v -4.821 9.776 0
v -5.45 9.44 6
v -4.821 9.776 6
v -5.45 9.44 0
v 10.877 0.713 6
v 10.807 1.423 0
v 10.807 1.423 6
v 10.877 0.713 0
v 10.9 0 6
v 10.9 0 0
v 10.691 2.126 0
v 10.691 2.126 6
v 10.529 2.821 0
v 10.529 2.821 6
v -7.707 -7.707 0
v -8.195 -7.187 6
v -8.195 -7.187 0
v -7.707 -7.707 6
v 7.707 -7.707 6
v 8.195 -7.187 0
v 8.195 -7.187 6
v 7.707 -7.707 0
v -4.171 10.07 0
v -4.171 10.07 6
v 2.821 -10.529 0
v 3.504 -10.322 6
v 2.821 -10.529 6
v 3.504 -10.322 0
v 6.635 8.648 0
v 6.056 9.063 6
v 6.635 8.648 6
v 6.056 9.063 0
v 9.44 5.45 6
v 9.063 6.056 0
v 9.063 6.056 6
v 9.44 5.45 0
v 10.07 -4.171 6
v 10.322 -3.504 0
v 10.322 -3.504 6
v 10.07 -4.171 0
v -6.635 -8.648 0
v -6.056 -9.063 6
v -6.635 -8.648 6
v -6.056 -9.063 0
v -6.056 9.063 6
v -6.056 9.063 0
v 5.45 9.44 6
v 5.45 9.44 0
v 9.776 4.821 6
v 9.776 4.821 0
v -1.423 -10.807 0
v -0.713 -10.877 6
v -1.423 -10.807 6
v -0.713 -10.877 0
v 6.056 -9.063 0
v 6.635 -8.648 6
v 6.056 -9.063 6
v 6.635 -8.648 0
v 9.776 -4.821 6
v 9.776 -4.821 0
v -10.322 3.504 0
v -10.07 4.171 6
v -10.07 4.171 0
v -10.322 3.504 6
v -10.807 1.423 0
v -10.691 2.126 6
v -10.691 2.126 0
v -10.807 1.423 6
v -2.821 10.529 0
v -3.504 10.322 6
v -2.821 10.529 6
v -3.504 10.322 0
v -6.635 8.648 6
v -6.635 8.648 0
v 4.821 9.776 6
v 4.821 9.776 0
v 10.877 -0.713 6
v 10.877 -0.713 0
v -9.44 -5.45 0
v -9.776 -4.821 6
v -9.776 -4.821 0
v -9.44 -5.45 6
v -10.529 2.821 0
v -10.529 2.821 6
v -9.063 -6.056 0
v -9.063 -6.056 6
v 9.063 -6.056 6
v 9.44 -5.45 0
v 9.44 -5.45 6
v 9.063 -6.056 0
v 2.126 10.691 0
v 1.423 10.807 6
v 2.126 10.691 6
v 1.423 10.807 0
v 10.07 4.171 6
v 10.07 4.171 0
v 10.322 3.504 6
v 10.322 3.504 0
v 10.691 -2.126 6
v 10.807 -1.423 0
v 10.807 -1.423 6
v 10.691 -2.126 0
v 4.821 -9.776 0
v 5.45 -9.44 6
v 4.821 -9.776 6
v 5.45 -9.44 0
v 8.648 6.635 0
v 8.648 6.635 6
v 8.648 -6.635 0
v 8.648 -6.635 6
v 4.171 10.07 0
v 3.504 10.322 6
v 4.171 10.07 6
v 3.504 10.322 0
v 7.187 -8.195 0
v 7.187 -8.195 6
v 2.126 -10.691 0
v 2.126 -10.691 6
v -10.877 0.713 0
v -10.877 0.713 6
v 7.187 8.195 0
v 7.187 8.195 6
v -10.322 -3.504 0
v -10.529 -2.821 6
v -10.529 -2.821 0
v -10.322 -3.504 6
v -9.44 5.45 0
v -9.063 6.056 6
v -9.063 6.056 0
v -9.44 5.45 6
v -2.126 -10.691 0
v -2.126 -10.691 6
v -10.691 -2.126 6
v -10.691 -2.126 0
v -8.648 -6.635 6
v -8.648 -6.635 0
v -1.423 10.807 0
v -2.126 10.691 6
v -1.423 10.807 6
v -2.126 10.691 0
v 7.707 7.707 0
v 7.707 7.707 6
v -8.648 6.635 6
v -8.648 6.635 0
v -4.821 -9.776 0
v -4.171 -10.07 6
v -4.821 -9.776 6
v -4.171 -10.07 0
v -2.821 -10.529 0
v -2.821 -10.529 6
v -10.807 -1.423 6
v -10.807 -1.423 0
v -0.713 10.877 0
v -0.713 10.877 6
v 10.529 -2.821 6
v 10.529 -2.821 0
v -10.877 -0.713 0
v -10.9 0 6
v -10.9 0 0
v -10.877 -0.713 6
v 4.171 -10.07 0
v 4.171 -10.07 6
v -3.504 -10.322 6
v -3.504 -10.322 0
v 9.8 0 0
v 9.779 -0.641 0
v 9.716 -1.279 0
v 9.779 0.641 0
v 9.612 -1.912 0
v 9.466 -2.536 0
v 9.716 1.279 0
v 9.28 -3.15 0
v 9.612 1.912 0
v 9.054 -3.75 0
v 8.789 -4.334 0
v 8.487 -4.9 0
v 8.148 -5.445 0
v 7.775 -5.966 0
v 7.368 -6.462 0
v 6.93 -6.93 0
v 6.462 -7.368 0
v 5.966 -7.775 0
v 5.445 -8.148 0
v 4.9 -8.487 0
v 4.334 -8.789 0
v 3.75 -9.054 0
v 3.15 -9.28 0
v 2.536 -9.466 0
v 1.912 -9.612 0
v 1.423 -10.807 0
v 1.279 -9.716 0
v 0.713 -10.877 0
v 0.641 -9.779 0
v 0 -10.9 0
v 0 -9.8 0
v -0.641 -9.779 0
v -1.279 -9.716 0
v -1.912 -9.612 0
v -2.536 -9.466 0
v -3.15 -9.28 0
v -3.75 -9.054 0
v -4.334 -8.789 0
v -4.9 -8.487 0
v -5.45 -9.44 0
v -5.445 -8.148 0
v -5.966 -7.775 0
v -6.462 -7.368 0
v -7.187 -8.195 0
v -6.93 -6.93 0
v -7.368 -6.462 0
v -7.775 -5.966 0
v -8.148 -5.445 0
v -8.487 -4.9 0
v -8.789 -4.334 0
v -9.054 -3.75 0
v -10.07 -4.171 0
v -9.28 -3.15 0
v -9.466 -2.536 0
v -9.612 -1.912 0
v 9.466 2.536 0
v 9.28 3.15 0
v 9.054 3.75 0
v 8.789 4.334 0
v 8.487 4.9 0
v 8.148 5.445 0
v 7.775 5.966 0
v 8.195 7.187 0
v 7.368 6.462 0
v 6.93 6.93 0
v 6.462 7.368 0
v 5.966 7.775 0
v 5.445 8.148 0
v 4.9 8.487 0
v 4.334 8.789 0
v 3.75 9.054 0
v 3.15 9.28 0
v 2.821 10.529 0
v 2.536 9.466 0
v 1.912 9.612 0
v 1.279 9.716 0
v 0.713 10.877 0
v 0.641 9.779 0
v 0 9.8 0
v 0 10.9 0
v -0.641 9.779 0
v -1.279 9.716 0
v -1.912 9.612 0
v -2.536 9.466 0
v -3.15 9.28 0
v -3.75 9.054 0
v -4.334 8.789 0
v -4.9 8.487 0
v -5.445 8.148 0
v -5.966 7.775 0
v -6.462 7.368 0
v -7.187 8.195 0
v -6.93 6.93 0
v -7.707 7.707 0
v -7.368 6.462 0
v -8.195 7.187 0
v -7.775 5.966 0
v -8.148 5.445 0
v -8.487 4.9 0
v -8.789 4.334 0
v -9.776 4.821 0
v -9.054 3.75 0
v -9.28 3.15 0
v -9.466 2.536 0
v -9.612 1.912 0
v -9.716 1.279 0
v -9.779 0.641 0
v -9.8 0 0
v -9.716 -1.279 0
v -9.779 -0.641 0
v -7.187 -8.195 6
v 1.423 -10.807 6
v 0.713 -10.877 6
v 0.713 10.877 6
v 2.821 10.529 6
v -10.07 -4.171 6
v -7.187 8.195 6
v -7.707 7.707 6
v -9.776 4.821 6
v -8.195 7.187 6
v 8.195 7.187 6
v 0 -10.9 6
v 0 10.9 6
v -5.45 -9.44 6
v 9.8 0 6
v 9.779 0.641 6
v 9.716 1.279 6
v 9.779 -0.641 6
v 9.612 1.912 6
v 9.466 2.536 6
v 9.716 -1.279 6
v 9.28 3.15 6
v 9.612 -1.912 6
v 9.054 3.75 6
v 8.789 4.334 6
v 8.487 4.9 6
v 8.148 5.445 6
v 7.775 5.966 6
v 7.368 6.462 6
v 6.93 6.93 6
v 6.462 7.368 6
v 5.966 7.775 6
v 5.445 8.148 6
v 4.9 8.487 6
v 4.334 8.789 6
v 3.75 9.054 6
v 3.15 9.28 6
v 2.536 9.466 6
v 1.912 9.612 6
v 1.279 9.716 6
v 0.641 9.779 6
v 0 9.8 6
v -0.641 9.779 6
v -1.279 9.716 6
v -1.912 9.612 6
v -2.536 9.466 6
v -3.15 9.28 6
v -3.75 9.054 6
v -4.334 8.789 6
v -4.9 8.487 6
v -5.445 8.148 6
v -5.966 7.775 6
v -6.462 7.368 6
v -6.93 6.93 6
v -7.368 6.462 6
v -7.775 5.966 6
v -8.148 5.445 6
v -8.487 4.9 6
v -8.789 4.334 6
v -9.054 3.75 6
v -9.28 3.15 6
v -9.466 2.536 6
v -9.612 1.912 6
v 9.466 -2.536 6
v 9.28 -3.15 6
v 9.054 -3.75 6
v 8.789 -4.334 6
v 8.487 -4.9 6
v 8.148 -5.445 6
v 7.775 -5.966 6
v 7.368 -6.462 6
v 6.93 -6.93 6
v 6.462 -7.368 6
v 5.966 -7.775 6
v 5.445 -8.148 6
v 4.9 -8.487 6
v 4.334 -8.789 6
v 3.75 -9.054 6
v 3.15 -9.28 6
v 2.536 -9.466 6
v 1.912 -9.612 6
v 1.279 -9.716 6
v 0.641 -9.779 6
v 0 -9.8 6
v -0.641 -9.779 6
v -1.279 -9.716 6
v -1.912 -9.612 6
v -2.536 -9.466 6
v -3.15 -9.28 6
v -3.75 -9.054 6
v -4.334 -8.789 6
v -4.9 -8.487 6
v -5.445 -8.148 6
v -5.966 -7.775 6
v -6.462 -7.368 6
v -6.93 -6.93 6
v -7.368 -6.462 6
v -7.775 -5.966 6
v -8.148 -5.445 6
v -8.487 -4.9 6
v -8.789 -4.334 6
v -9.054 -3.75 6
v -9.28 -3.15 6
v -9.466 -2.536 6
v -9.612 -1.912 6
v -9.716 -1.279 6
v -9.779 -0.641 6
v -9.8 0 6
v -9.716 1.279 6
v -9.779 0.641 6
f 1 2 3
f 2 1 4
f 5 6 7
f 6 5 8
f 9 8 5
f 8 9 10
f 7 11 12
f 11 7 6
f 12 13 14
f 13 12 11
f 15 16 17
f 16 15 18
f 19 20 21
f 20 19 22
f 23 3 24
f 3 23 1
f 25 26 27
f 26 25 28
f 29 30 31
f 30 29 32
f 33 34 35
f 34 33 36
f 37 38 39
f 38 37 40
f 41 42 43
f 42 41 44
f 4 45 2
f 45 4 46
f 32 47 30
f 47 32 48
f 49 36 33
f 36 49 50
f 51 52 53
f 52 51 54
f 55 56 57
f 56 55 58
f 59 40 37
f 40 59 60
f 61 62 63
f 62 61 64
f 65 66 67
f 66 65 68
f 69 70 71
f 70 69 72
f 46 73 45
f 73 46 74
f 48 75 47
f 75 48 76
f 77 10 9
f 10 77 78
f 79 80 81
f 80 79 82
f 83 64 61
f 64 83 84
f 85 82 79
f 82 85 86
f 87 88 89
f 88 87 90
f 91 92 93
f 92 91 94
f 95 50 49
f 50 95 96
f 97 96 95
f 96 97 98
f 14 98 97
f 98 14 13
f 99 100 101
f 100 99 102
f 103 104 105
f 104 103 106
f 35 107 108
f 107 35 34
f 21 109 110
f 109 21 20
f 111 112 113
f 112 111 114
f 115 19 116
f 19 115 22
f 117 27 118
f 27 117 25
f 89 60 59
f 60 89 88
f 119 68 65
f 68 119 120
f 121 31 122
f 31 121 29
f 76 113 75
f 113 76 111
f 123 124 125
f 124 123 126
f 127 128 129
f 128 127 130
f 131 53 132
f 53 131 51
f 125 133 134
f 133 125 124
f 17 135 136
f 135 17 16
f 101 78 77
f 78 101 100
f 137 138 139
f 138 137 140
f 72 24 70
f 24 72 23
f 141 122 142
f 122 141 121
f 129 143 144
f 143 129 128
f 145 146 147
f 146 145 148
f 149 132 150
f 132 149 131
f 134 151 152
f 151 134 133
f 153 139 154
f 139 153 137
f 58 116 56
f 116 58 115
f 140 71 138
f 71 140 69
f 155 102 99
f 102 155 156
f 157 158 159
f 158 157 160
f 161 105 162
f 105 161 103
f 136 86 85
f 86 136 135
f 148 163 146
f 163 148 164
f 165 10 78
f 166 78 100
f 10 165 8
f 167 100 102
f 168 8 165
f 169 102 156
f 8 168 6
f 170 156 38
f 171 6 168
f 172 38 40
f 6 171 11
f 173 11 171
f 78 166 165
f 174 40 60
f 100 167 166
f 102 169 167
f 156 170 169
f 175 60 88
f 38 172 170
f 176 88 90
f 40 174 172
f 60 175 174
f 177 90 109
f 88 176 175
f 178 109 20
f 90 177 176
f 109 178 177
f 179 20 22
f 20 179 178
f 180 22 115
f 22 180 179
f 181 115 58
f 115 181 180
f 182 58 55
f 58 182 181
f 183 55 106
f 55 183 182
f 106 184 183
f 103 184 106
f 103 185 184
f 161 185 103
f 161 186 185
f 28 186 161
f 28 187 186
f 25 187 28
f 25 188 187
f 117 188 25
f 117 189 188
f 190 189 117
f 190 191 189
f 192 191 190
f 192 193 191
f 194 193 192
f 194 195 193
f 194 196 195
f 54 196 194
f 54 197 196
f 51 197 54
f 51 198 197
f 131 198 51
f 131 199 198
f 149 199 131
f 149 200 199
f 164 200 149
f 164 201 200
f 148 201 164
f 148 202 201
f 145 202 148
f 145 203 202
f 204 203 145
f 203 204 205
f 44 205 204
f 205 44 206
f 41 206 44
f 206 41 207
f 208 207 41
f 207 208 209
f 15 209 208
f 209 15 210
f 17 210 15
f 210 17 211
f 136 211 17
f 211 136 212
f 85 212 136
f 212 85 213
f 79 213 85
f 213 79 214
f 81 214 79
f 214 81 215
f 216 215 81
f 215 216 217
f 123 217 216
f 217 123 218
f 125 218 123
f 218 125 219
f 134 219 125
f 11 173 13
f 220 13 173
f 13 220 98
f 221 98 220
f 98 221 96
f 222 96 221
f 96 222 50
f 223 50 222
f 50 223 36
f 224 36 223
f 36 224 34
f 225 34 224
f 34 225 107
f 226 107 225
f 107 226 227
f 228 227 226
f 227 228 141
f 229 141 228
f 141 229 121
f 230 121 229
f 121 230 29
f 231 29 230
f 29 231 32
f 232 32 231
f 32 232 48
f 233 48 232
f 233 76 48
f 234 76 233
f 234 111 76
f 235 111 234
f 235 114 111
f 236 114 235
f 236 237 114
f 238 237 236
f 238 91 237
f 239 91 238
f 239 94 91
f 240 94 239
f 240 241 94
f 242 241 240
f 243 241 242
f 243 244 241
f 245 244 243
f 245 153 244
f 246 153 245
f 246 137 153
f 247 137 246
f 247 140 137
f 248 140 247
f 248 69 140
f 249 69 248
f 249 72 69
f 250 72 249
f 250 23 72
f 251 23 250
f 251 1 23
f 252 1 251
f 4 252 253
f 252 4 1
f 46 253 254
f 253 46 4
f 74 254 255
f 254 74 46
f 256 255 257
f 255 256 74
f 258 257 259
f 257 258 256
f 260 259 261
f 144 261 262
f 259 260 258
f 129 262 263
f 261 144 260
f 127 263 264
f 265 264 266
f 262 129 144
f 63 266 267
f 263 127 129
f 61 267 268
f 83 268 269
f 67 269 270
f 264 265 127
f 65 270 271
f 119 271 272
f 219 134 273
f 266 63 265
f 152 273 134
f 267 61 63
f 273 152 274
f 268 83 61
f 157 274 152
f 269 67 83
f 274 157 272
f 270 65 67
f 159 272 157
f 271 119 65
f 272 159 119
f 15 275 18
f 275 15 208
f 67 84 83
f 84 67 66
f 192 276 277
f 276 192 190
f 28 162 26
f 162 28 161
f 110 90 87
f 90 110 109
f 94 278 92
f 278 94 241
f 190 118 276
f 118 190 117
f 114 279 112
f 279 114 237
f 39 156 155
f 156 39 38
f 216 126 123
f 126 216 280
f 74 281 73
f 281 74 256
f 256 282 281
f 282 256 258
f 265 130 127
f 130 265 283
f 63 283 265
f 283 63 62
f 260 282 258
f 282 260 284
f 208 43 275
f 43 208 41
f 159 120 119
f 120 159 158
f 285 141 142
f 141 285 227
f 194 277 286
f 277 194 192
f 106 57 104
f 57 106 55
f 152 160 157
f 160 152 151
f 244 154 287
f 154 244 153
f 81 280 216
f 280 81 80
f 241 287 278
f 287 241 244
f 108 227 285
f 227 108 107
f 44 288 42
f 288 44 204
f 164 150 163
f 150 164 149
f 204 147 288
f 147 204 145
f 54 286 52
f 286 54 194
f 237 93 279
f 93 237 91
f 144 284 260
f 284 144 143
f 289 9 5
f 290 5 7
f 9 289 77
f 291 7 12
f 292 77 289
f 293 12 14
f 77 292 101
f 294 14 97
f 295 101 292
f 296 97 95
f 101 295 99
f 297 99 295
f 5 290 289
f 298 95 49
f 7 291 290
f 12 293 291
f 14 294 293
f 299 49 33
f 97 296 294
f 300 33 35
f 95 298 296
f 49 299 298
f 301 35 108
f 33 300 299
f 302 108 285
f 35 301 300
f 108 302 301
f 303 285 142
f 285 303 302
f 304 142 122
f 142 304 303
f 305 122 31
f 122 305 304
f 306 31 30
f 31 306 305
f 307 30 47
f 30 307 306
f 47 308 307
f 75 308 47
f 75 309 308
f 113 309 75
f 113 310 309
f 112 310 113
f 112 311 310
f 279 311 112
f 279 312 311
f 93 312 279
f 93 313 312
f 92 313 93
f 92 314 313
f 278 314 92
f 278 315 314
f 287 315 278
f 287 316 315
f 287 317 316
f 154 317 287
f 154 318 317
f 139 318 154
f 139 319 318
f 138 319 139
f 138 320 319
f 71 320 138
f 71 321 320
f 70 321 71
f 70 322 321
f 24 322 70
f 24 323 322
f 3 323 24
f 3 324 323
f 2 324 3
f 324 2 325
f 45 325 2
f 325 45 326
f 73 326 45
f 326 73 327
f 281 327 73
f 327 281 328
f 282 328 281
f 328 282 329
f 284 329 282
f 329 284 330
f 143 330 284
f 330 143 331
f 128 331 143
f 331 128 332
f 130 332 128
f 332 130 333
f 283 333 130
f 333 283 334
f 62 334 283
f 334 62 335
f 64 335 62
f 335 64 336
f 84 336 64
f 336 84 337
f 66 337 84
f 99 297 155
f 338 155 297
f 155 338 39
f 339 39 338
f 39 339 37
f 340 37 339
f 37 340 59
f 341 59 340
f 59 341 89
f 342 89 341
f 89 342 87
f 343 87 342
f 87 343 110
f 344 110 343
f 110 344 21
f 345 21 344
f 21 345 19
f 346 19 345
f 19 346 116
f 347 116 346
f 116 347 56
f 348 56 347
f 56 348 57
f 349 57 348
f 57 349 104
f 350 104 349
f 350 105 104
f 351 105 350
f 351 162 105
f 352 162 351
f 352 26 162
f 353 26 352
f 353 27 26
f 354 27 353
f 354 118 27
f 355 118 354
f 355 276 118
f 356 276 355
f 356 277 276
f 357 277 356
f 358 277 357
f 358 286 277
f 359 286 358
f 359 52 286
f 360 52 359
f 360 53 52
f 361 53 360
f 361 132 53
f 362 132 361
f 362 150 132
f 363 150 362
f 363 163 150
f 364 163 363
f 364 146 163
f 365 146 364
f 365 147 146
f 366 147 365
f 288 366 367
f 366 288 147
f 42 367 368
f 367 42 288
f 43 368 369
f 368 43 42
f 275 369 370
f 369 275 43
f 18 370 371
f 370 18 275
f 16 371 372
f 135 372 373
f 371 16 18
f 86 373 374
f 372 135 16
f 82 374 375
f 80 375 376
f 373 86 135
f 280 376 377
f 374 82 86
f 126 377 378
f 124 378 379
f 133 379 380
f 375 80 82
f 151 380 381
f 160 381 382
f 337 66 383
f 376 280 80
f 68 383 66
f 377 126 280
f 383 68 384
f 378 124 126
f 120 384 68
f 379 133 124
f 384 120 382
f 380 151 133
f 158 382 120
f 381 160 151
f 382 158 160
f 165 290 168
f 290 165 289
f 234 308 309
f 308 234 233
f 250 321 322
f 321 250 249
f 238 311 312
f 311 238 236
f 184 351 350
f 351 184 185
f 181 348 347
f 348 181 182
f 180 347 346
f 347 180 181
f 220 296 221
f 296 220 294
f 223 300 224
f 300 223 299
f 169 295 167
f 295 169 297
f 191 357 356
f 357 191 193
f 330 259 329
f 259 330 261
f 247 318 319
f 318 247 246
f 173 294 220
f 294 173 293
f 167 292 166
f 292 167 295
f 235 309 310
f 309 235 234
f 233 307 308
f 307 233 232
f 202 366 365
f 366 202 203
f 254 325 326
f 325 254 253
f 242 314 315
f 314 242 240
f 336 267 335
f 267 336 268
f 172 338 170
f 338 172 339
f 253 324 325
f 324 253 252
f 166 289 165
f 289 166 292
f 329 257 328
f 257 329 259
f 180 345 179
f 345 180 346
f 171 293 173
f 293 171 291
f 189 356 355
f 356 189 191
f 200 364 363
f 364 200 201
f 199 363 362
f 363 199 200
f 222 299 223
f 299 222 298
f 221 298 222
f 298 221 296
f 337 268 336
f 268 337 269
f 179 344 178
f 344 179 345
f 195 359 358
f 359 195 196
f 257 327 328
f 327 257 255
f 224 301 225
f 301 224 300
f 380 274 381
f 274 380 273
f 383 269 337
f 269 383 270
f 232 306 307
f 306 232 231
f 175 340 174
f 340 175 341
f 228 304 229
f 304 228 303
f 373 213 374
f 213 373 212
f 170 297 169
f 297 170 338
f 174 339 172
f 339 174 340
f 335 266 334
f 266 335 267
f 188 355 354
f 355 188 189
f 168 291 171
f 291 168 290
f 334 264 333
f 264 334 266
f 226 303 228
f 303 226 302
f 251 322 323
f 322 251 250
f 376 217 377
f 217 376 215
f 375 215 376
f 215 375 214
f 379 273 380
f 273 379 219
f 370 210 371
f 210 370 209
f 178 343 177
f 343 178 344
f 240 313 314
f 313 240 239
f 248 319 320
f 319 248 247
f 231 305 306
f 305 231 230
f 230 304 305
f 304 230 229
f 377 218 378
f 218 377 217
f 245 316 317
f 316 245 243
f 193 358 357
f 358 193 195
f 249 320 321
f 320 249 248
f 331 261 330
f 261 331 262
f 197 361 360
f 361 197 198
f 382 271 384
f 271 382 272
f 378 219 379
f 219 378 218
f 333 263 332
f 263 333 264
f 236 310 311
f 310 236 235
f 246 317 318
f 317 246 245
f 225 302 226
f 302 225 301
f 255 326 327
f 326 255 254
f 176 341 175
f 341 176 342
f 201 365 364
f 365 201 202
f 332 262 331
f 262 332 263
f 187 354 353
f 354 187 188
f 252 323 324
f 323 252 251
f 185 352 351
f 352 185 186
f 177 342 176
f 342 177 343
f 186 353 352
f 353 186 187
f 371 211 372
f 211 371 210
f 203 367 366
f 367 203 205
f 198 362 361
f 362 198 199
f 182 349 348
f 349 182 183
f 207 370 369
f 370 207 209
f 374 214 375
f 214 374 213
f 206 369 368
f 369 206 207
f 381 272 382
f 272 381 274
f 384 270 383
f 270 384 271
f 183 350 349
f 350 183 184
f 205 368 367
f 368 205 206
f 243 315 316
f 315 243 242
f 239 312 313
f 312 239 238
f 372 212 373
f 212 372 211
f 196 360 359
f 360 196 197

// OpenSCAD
// spacer print.
include <model.scad>
view = "spacer_print";
